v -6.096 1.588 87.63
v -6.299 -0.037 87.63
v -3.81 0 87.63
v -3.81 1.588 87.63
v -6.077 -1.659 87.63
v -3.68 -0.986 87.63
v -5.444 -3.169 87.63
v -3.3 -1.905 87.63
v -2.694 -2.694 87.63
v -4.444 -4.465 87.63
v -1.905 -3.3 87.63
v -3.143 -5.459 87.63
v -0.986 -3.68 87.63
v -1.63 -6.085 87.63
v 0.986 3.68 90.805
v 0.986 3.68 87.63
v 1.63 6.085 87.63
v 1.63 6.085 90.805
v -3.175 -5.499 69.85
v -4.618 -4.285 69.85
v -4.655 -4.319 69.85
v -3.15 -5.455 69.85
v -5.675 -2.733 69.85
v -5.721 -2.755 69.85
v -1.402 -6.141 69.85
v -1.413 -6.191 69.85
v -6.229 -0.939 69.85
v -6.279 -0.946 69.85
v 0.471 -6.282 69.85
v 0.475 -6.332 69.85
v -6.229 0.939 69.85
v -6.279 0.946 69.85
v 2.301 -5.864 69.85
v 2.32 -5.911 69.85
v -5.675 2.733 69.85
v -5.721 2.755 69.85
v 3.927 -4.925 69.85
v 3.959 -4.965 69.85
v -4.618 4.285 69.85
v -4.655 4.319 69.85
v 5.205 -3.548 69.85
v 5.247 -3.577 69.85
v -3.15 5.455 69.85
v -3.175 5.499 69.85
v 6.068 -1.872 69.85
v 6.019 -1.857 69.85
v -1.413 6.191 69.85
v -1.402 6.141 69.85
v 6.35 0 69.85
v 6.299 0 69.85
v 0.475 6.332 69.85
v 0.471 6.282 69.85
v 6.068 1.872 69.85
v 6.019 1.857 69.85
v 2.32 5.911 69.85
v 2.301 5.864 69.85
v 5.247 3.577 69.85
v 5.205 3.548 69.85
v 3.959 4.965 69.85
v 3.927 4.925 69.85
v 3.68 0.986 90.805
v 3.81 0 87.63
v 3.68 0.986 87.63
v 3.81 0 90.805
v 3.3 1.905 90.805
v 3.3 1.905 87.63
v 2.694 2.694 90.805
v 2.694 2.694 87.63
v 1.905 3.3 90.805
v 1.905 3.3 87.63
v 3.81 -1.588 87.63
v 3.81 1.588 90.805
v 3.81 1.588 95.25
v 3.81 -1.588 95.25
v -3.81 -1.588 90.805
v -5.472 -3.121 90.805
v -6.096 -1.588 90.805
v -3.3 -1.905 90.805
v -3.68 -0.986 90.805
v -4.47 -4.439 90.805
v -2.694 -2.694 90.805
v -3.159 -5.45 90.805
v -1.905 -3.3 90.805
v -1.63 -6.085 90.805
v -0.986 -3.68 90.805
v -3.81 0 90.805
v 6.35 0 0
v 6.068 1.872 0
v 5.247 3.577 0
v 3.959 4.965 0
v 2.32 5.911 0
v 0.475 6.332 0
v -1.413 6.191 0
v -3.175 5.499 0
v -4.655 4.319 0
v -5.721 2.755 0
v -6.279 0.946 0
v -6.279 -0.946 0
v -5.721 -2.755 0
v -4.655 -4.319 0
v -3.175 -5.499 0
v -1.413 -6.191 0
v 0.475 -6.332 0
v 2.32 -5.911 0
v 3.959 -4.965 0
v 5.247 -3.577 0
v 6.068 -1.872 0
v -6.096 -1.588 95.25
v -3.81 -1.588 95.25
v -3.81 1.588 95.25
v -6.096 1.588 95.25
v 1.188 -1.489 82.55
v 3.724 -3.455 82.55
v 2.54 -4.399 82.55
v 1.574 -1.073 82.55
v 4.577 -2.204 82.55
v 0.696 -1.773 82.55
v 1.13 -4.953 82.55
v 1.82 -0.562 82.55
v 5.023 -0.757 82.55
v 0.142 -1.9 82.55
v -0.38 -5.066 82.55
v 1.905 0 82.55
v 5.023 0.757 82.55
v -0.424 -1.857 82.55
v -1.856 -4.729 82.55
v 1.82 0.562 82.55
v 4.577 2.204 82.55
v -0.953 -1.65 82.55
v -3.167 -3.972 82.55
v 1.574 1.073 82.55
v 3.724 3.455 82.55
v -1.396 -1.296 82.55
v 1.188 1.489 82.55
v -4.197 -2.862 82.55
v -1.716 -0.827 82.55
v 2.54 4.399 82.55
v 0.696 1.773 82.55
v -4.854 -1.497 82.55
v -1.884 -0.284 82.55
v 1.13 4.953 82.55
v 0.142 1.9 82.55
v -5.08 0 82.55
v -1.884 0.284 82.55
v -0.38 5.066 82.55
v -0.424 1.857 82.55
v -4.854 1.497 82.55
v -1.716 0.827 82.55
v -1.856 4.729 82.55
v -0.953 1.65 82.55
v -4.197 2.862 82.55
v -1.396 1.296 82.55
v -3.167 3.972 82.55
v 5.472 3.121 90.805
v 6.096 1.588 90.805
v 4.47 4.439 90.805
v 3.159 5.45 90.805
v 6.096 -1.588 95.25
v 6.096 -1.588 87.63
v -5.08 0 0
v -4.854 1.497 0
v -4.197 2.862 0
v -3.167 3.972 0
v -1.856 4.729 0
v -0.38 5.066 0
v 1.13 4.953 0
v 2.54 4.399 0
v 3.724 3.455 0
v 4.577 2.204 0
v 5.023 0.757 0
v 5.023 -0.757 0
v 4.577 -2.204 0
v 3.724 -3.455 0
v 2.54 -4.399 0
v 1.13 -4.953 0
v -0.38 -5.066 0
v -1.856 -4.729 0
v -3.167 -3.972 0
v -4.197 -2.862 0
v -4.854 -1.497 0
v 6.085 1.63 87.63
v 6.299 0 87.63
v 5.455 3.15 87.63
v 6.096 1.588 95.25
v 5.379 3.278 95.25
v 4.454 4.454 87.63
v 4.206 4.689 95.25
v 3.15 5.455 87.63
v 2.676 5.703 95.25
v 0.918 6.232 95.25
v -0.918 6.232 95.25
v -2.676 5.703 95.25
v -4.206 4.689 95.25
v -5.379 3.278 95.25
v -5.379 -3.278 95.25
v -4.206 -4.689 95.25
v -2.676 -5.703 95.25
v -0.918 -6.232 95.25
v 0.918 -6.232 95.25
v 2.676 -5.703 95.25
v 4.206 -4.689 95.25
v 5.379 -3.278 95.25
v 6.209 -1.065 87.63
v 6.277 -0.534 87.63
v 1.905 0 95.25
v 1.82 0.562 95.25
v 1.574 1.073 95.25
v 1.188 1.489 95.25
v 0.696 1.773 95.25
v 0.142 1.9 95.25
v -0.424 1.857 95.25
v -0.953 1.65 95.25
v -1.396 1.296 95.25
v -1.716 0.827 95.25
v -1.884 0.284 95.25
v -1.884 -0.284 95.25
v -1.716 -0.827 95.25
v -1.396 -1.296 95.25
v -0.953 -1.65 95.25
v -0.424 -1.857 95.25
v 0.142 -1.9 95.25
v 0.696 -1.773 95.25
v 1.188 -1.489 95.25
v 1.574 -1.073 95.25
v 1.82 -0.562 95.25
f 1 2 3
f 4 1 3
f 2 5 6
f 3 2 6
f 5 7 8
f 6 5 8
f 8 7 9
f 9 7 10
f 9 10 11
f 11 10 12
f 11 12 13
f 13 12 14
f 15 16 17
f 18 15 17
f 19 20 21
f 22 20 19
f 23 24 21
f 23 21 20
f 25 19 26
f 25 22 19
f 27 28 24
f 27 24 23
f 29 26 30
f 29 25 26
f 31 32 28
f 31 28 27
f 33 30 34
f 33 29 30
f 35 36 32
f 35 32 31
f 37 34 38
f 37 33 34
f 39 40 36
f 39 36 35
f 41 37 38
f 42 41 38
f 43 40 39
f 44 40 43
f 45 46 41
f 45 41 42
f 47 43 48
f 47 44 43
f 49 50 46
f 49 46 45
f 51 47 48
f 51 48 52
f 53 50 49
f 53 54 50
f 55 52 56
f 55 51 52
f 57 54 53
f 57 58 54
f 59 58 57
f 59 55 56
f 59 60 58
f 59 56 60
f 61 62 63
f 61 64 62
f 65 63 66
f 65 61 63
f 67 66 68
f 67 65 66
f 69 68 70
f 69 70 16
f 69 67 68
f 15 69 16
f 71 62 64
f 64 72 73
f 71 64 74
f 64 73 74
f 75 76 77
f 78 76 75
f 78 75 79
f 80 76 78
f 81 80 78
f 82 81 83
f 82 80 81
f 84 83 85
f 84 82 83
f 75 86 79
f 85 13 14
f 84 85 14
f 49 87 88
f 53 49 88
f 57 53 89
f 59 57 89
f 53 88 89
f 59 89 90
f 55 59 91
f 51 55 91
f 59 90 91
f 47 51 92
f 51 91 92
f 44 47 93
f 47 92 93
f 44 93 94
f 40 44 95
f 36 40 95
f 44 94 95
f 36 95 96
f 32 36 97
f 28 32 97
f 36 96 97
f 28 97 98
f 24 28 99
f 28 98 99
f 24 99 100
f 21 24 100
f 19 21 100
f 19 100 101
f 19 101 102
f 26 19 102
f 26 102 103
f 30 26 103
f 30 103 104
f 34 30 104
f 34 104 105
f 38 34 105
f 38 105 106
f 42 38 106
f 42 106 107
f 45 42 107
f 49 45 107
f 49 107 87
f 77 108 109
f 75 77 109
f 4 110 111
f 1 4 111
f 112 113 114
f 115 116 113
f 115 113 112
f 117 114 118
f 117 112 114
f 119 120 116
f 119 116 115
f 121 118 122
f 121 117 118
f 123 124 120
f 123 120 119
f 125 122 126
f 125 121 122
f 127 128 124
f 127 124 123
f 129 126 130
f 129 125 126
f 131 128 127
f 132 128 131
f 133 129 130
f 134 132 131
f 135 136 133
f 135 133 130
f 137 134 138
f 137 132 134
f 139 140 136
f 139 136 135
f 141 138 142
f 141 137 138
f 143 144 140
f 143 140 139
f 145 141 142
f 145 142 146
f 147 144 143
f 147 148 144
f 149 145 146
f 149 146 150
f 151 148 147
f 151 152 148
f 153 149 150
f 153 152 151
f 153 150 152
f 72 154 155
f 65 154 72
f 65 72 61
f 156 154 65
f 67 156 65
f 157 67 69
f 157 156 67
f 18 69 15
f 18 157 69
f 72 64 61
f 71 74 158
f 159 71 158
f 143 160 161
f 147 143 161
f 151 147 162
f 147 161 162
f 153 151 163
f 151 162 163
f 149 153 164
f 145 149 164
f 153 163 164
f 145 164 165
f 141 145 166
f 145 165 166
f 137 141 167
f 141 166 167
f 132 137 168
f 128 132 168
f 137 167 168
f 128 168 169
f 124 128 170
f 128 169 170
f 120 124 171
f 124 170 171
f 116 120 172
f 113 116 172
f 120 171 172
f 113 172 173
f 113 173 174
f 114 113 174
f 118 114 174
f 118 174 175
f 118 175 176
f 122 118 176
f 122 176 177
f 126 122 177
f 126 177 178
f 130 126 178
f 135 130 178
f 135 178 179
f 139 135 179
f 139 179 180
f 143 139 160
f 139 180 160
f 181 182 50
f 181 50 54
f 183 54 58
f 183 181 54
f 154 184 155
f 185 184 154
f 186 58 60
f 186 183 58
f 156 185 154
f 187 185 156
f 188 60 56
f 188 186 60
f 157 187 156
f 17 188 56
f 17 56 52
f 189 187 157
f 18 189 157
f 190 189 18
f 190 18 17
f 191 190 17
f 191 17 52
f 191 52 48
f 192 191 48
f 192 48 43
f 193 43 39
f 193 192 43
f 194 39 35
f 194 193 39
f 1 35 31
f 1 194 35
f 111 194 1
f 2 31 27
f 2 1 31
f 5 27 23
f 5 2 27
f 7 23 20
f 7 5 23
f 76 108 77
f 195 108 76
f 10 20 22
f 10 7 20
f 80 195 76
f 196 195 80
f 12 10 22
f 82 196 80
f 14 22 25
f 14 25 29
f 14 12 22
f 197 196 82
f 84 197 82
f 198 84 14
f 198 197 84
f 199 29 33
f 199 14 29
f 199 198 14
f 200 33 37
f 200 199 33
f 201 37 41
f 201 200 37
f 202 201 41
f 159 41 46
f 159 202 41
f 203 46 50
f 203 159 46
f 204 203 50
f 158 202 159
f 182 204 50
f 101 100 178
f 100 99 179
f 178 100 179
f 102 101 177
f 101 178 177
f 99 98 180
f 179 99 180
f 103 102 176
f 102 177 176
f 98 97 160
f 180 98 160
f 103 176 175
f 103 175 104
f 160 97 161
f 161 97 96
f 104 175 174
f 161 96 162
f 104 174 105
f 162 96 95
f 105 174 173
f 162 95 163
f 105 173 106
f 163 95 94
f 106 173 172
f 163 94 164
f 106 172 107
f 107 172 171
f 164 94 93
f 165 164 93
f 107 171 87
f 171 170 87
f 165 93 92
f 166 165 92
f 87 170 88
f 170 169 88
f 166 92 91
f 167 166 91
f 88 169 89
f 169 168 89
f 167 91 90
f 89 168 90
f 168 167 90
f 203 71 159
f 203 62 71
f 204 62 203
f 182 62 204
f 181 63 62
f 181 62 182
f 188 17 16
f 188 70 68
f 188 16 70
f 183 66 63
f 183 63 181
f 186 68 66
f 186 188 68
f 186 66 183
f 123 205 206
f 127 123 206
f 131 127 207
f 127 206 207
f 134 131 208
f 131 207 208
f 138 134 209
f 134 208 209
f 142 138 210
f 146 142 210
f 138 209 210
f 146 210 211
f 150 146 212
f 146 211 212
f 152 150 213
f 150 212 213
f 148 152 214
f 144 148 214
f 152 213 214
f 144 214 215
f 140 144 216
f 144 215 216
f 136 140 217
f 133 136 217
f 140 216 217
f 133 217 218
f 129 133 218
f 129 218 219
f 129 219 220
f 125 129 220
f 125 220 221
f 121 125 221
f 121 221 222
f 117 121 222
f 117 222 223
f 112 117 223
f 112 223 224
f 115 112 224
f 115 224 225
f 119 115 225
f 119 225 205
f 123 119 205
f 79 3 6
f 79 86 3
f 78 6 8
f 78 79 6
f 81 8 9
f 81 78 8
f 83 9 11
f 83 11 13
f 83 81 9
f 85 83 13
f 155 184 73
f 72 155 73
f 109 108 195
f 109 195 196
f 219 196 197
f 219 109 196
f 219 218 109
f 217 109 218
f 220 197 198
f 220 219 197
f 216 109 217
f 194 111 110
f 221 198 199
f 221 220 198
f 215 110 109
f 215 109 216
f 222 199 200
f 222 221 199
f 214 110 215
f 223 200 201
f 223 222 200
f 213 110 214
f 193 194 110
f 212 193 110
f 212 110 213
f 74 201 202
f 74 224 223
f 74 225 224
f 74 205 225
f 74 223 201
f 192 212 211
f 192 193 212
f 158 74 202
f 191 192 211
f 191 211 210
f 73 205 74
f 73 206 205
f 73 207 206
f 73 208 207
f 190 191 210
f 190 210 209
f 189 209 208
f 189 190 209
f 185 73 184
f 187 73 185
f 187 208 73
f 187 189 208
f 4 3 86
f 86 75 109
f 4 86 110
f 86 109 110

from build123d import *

# Parameters (mm, degrees)
SKETCH1_R           = 6.35
BOSS_EXTRUDE1_DEPTH = 95.25
SKETCH2_R           = 5.08
CUT_EXTRUDE1_DEPTH  = 82.55
SKETCH3_R           = 1.905
CUT_EXTRUDE2_DEPTH  = 114.3
CUT_EXTRUDE8_DEPTH  = 7.62
CUT_REVOLVE1_ANGLE  = 75
SKETCH8_R           = 6.35
SKETCH8_R_2         = 6.2992
CUT_EXTRUDE10_DEPTH = 25.4


with BuildPart() as part:
    # Sketch1 → Boss-Extrude1 (new body)
    with BuildSketch(Plane.XY):
        Circle(SKETCH1_R)
    extrude(amount=BOSS_EXTRUDE1_DEPTH)

    # Sketch2 → Cut-Extrude1 (cut)
    with BuildSketch(Plane(origin=(0, 0, 0), x_dir=(-1, 0, 0), z_dir=(0, 0, -1))):
        Circle(SKETCH2_R)
    extrude(amount=-CUT_EXTRUDE1_DEPTH, mode=Mode.SUBTRACT)

    # Sketch3 → Cut-Extrude2 (cut)
    with BuildSketch(Plane.XY.offset(95.25)):
        Circle(SKETCH3_R)
    extrude(amount=-CUT_EXTRUDE2_DEPTH, mode=Mode.SUBTRACT)

    # Sketch5 → Cut-Extrude8 (cut)
    with BuildSketch(Plane.XY.offset(95.25)):
        with BuildLine():
            ThreePointArc((6.35, 0), (6.299388571, 0.800127257), (6.148361062, 1.5875))
            Line((6.148361062, 1.5875), (3.81, 1.5875))
            Line((3.81, 1.5875), (3.81, -1.5875))
            Line((3.81, -1.5875), (6.148361062, -1.5875))
            ThreePointArc((6.148361062, -1.5875), (6.299388571, -0.800127257), (6.35, 0))
        make_face()
        with BuildLine():
            Line((-3.81, 1.5875), (-6.148361062, 1.5875))
            ThreePointArc((-6.148361062, 1.5875), (-6.35, 0), (-6.148361062, -1.5875))
            Line((-6.148361062, -1.5875), (-3.81, -1.5875))
            Line((-3.81, -1.5875), (-3.81, 1.5875))
        make_face()
    extrude(amount=-CUT_EXTRUDE8_DEPTH, mode=Mode.SUBTRACT)

    # Sketch7 → Cut-Revolve1 (revolve, cut)
    with BuildSketch(Plane(origin=(0, 0, 0), x_dir=(1, 0, 0), z_dir=(0, 1, 0))):
        Polygon((6.148361062, -87.63), (3.81, -87.63), (3.81, -90.805), (6.35, -90.805), (6.35, -87.63), align=None)
        Polygon((-3.81, -90.805), (-6.35, -90.805), (-6.35, -87.63), (-6.148361062, -87.63), (-3.81, -87.63), align=None)
    revolve(axis=Axis((0, 0, 0), (0, 0, 1)), revolution_arc=CUT_REVOLVE1_ANGLE, mode=Mode.SUBTRACT)

    # Sketch8 → Cut-Extrude10 (cut)
    with BuildSketch(Plane.XY.offset(95.25)):
        Circle(SKETCH8_R)
        Circle(SKETCH8_R_2, mode=Mode.SUBTRACT)
    extrude(amount=-CUT_EXTRUDE10_DEPTH, mode=Mode.SUBTRACT)


solid = part.part
